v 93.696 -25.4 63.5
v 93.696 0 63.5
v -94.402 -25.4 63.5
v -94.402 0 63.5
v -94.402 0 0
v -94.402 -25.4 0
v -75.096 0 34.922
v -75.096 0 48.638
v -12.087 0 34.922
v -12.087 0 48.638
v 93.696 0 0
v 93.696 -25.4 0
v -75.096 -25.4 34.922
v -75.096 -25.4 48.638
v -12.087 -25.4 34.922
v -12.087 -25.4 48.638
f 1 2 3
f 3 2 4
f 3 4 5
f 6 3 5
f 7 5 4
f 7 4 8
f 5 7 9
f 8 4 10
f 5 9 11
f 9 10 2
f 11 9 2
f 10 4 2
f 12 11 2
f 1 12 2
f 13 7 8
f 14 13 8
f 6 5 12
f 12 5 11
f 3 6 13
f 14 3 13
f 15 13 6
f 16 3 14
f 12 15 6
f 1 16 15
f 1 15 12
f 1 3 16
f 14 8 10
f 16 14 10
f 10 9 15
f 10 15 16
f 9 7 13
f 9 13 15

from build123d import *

# Parameters (mm, degrees)
F0_W     = 63.008573
F0_H     = 13.715997
F0_W_2   = 105.548358
F0_H_2   = 63.5
F1_DEPTH = 25.4


with BuildPart() as f1:
    # F0 (on Front) → F1 (new body)
    with BuildSketch(Plane.XZ):
        Polygon((-94.402148, 63.5), (-94.402148, 0), (-75.095862, 0), (-56.045862, 0), (-11.852148, 0), (-11.852148, 63.5), align=None)
        with Locations((-43.591575, 41.780356)):
            Rectangle(F0_W, F0_H, mode=Mode.SUBTRACT)
        with Locations((40.922031, 31.75)):
            Rectangle(F0_W_2, F0_H_2)
    extrude(amount=F1_DEPTH)


solid = f1.part
